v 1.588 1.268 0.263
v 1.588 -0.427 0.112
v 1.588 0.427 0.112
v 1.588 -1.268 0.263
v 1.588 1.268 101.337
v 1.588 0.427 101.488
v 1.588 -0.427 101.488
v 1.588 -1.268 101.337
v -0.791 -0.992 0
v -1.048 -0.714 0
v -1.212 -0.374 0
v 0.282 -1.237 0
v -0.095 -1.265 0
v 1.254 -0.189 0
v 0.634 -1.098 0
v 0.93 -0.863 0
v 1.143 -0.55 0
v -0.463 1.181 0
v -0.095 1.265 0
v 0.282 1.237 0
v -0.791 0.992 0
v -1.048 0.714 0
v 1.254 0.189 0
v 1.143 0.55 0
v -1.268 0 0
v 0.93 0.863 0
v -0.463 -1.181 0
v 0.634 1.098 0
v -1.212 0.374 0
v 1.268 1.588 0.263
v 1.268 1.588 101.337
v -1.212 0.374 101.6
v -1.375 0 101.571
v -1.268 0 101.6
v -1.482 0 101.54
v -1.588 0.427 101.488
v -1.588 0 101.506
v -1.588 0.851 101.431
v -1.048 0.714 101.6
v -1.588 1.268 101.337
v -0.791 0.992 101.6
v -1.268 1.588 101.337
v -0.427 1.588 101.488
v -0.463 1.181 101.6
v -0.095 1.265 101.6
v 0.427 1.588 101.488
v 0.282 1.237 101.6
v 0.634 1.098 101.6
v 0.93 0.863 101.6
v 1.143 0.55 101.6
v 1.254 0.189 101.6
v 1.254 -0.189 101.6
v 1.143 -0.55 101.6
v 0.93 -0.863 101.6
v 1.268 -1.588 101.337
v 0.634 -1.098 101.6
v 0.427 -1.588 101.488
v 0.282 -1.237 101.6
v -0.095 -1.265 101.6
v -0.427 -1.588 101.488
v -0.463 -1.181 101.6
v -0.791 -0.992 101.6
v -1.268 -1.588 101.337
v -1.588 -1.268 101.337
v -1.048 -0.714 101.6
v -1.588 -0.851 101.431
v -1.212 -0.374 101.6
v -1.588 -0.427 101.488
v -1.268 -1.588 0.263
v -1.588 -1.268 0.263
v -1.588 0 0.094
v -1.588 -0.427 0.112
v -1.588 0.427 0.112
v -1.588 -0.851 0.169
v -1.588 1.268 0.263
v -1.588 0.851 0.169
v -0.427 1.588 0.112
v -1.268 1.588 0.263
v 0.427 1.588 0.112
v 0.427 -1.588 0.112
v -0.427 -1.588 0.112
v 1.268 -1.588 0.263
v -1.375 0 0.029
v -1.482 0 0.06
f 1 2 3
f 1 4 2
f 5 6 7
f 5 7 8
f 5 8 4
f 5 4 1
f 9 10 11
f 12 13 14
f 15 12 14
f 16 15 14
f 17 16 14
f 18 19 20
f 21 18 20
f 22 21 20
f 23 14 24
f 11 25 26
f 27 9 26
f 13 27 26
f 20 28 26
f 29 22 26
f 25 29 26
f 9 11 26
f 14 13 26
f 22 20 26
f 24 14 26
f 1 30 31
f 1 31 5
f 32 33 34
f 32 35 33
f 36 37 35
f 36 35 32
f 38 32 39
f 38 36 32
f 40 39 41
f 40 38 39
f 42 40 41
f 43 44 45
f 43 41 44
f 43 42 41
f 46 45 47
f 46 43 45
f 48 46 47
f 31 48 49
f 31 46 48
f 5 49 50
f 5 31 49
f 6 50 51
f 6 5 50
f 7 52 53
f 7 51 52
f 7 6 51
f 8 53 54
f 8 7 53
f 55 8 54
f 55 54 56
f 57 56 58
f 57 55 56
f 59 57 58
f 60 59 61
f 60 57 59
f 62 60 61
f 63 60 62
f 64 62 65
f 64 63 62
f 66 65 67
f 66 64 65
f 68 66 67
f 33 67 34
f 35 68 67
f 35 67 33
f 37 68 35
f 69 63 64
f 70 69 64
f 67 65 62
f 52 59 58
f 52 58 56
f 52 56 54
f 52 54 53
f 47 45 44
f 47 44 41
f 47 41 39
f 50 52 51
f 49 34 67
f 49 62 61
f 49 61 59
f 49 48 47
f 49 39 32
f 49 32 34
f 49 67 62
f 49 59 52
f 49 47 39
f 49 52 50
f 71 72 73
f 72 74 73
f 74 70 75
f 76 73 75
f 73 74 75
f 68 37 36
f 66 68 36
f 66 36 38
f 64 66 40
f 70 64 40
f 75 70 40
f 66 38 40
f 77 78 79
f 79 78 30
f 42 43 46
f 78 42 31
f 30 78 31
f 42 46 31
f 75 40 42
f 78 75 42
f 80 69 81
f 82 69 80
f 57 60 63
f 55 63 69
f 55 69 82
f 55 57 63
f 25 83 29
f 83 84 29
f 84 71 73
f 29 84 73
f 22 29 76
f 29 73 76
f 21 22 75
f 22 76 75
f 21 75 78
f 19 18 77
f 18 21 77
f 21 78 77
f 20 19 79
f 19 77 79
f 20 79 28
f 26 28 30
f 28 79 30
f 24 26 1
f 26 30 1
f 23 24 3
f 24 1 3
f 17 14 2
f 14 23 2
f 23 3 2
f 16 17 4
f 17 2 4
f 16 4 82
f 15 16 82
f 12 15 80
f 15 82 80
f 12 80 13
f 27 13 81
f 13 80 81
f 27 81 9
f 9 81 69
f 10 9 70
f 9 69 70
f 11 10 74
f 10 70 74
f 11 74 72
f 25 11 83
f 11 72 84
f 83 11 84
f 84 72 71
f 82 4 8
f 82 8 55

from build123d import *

# Parameters (mm, degrees)
SKETCH1_W           = 3.175
SKETCH1_H           = 3.175
BOSS_EXTRUDE1_DEPTH = 50.8
SKETCH2_OUTSIDE_W   = 15.376
SKETCH2_OUTSIDE_H   = 15.375
SKETCH2_OUTSIDE_R   = 2.032
CUT_EXTRUDE1_DEPTH  = 51.8


with BuildPart() as part:
    # Sketch1 → Boss-Extrude1 (new body)
    with BuildSketch(Plane.XY):
        Rectangle(SKETCH1_W, SKETCH1_H)
    extrude(amount=BOSS_EXTRUDE1_DEPTH)

    # Sketch2 outside → Cut-Extrude1 (cut, through all)
    with BuildSketch(Plane(origin=(0, 0, 0), x_dir=(-1, 0, 0), z_dir=(0, 0, -1))):
        with Locations((0, -0.0005)):
            Rectangle(SKETCH2_OUTSIDE_W, SKETCH2_OUTSIDE_H)
        Circle(SKETCH2_OUTSIDE_R, mode=Mode.SUBTRACT)
    extrude(amount=-CUT_EXTRUDE1_DEPTH, mode=Mode.SUBTRACT)

    # Sketch3 → Cut-Revolve1 (revolve, cut)
    with BuildSketch(Plane(origin=(0, 0, 0), x_dir=(1, 0, 0), z_dir=(0, 1, 0))):
        with BuildLine():
            Line((-5.053685963, -4.40273269), (-5.053685963, 5.740530545))
            Line((-5.053685963, 5.740530545), (0, 5.740530545))
            Line((0, 5.740530545), (0, 0.160877736))
            ThreePointArc((0, 0.160877736), (-3.404639553, -1.148866368), (-5.053685963, -4.40273269))
        make_face()
    revolve(axis=Axis((0, 0, 50.8), (0, 0, -1)), mode=Mode.SUBTRACT)

    # Mirror1: part across plane


with BuildPart() as part_1:
    add(part.part)
    add(part.part.mirror(Plane(origin=(0, 0, 50.8), x_dir=(1, 0, 0), z_dir=(0, 0, -1))))


solid = part_1.part
